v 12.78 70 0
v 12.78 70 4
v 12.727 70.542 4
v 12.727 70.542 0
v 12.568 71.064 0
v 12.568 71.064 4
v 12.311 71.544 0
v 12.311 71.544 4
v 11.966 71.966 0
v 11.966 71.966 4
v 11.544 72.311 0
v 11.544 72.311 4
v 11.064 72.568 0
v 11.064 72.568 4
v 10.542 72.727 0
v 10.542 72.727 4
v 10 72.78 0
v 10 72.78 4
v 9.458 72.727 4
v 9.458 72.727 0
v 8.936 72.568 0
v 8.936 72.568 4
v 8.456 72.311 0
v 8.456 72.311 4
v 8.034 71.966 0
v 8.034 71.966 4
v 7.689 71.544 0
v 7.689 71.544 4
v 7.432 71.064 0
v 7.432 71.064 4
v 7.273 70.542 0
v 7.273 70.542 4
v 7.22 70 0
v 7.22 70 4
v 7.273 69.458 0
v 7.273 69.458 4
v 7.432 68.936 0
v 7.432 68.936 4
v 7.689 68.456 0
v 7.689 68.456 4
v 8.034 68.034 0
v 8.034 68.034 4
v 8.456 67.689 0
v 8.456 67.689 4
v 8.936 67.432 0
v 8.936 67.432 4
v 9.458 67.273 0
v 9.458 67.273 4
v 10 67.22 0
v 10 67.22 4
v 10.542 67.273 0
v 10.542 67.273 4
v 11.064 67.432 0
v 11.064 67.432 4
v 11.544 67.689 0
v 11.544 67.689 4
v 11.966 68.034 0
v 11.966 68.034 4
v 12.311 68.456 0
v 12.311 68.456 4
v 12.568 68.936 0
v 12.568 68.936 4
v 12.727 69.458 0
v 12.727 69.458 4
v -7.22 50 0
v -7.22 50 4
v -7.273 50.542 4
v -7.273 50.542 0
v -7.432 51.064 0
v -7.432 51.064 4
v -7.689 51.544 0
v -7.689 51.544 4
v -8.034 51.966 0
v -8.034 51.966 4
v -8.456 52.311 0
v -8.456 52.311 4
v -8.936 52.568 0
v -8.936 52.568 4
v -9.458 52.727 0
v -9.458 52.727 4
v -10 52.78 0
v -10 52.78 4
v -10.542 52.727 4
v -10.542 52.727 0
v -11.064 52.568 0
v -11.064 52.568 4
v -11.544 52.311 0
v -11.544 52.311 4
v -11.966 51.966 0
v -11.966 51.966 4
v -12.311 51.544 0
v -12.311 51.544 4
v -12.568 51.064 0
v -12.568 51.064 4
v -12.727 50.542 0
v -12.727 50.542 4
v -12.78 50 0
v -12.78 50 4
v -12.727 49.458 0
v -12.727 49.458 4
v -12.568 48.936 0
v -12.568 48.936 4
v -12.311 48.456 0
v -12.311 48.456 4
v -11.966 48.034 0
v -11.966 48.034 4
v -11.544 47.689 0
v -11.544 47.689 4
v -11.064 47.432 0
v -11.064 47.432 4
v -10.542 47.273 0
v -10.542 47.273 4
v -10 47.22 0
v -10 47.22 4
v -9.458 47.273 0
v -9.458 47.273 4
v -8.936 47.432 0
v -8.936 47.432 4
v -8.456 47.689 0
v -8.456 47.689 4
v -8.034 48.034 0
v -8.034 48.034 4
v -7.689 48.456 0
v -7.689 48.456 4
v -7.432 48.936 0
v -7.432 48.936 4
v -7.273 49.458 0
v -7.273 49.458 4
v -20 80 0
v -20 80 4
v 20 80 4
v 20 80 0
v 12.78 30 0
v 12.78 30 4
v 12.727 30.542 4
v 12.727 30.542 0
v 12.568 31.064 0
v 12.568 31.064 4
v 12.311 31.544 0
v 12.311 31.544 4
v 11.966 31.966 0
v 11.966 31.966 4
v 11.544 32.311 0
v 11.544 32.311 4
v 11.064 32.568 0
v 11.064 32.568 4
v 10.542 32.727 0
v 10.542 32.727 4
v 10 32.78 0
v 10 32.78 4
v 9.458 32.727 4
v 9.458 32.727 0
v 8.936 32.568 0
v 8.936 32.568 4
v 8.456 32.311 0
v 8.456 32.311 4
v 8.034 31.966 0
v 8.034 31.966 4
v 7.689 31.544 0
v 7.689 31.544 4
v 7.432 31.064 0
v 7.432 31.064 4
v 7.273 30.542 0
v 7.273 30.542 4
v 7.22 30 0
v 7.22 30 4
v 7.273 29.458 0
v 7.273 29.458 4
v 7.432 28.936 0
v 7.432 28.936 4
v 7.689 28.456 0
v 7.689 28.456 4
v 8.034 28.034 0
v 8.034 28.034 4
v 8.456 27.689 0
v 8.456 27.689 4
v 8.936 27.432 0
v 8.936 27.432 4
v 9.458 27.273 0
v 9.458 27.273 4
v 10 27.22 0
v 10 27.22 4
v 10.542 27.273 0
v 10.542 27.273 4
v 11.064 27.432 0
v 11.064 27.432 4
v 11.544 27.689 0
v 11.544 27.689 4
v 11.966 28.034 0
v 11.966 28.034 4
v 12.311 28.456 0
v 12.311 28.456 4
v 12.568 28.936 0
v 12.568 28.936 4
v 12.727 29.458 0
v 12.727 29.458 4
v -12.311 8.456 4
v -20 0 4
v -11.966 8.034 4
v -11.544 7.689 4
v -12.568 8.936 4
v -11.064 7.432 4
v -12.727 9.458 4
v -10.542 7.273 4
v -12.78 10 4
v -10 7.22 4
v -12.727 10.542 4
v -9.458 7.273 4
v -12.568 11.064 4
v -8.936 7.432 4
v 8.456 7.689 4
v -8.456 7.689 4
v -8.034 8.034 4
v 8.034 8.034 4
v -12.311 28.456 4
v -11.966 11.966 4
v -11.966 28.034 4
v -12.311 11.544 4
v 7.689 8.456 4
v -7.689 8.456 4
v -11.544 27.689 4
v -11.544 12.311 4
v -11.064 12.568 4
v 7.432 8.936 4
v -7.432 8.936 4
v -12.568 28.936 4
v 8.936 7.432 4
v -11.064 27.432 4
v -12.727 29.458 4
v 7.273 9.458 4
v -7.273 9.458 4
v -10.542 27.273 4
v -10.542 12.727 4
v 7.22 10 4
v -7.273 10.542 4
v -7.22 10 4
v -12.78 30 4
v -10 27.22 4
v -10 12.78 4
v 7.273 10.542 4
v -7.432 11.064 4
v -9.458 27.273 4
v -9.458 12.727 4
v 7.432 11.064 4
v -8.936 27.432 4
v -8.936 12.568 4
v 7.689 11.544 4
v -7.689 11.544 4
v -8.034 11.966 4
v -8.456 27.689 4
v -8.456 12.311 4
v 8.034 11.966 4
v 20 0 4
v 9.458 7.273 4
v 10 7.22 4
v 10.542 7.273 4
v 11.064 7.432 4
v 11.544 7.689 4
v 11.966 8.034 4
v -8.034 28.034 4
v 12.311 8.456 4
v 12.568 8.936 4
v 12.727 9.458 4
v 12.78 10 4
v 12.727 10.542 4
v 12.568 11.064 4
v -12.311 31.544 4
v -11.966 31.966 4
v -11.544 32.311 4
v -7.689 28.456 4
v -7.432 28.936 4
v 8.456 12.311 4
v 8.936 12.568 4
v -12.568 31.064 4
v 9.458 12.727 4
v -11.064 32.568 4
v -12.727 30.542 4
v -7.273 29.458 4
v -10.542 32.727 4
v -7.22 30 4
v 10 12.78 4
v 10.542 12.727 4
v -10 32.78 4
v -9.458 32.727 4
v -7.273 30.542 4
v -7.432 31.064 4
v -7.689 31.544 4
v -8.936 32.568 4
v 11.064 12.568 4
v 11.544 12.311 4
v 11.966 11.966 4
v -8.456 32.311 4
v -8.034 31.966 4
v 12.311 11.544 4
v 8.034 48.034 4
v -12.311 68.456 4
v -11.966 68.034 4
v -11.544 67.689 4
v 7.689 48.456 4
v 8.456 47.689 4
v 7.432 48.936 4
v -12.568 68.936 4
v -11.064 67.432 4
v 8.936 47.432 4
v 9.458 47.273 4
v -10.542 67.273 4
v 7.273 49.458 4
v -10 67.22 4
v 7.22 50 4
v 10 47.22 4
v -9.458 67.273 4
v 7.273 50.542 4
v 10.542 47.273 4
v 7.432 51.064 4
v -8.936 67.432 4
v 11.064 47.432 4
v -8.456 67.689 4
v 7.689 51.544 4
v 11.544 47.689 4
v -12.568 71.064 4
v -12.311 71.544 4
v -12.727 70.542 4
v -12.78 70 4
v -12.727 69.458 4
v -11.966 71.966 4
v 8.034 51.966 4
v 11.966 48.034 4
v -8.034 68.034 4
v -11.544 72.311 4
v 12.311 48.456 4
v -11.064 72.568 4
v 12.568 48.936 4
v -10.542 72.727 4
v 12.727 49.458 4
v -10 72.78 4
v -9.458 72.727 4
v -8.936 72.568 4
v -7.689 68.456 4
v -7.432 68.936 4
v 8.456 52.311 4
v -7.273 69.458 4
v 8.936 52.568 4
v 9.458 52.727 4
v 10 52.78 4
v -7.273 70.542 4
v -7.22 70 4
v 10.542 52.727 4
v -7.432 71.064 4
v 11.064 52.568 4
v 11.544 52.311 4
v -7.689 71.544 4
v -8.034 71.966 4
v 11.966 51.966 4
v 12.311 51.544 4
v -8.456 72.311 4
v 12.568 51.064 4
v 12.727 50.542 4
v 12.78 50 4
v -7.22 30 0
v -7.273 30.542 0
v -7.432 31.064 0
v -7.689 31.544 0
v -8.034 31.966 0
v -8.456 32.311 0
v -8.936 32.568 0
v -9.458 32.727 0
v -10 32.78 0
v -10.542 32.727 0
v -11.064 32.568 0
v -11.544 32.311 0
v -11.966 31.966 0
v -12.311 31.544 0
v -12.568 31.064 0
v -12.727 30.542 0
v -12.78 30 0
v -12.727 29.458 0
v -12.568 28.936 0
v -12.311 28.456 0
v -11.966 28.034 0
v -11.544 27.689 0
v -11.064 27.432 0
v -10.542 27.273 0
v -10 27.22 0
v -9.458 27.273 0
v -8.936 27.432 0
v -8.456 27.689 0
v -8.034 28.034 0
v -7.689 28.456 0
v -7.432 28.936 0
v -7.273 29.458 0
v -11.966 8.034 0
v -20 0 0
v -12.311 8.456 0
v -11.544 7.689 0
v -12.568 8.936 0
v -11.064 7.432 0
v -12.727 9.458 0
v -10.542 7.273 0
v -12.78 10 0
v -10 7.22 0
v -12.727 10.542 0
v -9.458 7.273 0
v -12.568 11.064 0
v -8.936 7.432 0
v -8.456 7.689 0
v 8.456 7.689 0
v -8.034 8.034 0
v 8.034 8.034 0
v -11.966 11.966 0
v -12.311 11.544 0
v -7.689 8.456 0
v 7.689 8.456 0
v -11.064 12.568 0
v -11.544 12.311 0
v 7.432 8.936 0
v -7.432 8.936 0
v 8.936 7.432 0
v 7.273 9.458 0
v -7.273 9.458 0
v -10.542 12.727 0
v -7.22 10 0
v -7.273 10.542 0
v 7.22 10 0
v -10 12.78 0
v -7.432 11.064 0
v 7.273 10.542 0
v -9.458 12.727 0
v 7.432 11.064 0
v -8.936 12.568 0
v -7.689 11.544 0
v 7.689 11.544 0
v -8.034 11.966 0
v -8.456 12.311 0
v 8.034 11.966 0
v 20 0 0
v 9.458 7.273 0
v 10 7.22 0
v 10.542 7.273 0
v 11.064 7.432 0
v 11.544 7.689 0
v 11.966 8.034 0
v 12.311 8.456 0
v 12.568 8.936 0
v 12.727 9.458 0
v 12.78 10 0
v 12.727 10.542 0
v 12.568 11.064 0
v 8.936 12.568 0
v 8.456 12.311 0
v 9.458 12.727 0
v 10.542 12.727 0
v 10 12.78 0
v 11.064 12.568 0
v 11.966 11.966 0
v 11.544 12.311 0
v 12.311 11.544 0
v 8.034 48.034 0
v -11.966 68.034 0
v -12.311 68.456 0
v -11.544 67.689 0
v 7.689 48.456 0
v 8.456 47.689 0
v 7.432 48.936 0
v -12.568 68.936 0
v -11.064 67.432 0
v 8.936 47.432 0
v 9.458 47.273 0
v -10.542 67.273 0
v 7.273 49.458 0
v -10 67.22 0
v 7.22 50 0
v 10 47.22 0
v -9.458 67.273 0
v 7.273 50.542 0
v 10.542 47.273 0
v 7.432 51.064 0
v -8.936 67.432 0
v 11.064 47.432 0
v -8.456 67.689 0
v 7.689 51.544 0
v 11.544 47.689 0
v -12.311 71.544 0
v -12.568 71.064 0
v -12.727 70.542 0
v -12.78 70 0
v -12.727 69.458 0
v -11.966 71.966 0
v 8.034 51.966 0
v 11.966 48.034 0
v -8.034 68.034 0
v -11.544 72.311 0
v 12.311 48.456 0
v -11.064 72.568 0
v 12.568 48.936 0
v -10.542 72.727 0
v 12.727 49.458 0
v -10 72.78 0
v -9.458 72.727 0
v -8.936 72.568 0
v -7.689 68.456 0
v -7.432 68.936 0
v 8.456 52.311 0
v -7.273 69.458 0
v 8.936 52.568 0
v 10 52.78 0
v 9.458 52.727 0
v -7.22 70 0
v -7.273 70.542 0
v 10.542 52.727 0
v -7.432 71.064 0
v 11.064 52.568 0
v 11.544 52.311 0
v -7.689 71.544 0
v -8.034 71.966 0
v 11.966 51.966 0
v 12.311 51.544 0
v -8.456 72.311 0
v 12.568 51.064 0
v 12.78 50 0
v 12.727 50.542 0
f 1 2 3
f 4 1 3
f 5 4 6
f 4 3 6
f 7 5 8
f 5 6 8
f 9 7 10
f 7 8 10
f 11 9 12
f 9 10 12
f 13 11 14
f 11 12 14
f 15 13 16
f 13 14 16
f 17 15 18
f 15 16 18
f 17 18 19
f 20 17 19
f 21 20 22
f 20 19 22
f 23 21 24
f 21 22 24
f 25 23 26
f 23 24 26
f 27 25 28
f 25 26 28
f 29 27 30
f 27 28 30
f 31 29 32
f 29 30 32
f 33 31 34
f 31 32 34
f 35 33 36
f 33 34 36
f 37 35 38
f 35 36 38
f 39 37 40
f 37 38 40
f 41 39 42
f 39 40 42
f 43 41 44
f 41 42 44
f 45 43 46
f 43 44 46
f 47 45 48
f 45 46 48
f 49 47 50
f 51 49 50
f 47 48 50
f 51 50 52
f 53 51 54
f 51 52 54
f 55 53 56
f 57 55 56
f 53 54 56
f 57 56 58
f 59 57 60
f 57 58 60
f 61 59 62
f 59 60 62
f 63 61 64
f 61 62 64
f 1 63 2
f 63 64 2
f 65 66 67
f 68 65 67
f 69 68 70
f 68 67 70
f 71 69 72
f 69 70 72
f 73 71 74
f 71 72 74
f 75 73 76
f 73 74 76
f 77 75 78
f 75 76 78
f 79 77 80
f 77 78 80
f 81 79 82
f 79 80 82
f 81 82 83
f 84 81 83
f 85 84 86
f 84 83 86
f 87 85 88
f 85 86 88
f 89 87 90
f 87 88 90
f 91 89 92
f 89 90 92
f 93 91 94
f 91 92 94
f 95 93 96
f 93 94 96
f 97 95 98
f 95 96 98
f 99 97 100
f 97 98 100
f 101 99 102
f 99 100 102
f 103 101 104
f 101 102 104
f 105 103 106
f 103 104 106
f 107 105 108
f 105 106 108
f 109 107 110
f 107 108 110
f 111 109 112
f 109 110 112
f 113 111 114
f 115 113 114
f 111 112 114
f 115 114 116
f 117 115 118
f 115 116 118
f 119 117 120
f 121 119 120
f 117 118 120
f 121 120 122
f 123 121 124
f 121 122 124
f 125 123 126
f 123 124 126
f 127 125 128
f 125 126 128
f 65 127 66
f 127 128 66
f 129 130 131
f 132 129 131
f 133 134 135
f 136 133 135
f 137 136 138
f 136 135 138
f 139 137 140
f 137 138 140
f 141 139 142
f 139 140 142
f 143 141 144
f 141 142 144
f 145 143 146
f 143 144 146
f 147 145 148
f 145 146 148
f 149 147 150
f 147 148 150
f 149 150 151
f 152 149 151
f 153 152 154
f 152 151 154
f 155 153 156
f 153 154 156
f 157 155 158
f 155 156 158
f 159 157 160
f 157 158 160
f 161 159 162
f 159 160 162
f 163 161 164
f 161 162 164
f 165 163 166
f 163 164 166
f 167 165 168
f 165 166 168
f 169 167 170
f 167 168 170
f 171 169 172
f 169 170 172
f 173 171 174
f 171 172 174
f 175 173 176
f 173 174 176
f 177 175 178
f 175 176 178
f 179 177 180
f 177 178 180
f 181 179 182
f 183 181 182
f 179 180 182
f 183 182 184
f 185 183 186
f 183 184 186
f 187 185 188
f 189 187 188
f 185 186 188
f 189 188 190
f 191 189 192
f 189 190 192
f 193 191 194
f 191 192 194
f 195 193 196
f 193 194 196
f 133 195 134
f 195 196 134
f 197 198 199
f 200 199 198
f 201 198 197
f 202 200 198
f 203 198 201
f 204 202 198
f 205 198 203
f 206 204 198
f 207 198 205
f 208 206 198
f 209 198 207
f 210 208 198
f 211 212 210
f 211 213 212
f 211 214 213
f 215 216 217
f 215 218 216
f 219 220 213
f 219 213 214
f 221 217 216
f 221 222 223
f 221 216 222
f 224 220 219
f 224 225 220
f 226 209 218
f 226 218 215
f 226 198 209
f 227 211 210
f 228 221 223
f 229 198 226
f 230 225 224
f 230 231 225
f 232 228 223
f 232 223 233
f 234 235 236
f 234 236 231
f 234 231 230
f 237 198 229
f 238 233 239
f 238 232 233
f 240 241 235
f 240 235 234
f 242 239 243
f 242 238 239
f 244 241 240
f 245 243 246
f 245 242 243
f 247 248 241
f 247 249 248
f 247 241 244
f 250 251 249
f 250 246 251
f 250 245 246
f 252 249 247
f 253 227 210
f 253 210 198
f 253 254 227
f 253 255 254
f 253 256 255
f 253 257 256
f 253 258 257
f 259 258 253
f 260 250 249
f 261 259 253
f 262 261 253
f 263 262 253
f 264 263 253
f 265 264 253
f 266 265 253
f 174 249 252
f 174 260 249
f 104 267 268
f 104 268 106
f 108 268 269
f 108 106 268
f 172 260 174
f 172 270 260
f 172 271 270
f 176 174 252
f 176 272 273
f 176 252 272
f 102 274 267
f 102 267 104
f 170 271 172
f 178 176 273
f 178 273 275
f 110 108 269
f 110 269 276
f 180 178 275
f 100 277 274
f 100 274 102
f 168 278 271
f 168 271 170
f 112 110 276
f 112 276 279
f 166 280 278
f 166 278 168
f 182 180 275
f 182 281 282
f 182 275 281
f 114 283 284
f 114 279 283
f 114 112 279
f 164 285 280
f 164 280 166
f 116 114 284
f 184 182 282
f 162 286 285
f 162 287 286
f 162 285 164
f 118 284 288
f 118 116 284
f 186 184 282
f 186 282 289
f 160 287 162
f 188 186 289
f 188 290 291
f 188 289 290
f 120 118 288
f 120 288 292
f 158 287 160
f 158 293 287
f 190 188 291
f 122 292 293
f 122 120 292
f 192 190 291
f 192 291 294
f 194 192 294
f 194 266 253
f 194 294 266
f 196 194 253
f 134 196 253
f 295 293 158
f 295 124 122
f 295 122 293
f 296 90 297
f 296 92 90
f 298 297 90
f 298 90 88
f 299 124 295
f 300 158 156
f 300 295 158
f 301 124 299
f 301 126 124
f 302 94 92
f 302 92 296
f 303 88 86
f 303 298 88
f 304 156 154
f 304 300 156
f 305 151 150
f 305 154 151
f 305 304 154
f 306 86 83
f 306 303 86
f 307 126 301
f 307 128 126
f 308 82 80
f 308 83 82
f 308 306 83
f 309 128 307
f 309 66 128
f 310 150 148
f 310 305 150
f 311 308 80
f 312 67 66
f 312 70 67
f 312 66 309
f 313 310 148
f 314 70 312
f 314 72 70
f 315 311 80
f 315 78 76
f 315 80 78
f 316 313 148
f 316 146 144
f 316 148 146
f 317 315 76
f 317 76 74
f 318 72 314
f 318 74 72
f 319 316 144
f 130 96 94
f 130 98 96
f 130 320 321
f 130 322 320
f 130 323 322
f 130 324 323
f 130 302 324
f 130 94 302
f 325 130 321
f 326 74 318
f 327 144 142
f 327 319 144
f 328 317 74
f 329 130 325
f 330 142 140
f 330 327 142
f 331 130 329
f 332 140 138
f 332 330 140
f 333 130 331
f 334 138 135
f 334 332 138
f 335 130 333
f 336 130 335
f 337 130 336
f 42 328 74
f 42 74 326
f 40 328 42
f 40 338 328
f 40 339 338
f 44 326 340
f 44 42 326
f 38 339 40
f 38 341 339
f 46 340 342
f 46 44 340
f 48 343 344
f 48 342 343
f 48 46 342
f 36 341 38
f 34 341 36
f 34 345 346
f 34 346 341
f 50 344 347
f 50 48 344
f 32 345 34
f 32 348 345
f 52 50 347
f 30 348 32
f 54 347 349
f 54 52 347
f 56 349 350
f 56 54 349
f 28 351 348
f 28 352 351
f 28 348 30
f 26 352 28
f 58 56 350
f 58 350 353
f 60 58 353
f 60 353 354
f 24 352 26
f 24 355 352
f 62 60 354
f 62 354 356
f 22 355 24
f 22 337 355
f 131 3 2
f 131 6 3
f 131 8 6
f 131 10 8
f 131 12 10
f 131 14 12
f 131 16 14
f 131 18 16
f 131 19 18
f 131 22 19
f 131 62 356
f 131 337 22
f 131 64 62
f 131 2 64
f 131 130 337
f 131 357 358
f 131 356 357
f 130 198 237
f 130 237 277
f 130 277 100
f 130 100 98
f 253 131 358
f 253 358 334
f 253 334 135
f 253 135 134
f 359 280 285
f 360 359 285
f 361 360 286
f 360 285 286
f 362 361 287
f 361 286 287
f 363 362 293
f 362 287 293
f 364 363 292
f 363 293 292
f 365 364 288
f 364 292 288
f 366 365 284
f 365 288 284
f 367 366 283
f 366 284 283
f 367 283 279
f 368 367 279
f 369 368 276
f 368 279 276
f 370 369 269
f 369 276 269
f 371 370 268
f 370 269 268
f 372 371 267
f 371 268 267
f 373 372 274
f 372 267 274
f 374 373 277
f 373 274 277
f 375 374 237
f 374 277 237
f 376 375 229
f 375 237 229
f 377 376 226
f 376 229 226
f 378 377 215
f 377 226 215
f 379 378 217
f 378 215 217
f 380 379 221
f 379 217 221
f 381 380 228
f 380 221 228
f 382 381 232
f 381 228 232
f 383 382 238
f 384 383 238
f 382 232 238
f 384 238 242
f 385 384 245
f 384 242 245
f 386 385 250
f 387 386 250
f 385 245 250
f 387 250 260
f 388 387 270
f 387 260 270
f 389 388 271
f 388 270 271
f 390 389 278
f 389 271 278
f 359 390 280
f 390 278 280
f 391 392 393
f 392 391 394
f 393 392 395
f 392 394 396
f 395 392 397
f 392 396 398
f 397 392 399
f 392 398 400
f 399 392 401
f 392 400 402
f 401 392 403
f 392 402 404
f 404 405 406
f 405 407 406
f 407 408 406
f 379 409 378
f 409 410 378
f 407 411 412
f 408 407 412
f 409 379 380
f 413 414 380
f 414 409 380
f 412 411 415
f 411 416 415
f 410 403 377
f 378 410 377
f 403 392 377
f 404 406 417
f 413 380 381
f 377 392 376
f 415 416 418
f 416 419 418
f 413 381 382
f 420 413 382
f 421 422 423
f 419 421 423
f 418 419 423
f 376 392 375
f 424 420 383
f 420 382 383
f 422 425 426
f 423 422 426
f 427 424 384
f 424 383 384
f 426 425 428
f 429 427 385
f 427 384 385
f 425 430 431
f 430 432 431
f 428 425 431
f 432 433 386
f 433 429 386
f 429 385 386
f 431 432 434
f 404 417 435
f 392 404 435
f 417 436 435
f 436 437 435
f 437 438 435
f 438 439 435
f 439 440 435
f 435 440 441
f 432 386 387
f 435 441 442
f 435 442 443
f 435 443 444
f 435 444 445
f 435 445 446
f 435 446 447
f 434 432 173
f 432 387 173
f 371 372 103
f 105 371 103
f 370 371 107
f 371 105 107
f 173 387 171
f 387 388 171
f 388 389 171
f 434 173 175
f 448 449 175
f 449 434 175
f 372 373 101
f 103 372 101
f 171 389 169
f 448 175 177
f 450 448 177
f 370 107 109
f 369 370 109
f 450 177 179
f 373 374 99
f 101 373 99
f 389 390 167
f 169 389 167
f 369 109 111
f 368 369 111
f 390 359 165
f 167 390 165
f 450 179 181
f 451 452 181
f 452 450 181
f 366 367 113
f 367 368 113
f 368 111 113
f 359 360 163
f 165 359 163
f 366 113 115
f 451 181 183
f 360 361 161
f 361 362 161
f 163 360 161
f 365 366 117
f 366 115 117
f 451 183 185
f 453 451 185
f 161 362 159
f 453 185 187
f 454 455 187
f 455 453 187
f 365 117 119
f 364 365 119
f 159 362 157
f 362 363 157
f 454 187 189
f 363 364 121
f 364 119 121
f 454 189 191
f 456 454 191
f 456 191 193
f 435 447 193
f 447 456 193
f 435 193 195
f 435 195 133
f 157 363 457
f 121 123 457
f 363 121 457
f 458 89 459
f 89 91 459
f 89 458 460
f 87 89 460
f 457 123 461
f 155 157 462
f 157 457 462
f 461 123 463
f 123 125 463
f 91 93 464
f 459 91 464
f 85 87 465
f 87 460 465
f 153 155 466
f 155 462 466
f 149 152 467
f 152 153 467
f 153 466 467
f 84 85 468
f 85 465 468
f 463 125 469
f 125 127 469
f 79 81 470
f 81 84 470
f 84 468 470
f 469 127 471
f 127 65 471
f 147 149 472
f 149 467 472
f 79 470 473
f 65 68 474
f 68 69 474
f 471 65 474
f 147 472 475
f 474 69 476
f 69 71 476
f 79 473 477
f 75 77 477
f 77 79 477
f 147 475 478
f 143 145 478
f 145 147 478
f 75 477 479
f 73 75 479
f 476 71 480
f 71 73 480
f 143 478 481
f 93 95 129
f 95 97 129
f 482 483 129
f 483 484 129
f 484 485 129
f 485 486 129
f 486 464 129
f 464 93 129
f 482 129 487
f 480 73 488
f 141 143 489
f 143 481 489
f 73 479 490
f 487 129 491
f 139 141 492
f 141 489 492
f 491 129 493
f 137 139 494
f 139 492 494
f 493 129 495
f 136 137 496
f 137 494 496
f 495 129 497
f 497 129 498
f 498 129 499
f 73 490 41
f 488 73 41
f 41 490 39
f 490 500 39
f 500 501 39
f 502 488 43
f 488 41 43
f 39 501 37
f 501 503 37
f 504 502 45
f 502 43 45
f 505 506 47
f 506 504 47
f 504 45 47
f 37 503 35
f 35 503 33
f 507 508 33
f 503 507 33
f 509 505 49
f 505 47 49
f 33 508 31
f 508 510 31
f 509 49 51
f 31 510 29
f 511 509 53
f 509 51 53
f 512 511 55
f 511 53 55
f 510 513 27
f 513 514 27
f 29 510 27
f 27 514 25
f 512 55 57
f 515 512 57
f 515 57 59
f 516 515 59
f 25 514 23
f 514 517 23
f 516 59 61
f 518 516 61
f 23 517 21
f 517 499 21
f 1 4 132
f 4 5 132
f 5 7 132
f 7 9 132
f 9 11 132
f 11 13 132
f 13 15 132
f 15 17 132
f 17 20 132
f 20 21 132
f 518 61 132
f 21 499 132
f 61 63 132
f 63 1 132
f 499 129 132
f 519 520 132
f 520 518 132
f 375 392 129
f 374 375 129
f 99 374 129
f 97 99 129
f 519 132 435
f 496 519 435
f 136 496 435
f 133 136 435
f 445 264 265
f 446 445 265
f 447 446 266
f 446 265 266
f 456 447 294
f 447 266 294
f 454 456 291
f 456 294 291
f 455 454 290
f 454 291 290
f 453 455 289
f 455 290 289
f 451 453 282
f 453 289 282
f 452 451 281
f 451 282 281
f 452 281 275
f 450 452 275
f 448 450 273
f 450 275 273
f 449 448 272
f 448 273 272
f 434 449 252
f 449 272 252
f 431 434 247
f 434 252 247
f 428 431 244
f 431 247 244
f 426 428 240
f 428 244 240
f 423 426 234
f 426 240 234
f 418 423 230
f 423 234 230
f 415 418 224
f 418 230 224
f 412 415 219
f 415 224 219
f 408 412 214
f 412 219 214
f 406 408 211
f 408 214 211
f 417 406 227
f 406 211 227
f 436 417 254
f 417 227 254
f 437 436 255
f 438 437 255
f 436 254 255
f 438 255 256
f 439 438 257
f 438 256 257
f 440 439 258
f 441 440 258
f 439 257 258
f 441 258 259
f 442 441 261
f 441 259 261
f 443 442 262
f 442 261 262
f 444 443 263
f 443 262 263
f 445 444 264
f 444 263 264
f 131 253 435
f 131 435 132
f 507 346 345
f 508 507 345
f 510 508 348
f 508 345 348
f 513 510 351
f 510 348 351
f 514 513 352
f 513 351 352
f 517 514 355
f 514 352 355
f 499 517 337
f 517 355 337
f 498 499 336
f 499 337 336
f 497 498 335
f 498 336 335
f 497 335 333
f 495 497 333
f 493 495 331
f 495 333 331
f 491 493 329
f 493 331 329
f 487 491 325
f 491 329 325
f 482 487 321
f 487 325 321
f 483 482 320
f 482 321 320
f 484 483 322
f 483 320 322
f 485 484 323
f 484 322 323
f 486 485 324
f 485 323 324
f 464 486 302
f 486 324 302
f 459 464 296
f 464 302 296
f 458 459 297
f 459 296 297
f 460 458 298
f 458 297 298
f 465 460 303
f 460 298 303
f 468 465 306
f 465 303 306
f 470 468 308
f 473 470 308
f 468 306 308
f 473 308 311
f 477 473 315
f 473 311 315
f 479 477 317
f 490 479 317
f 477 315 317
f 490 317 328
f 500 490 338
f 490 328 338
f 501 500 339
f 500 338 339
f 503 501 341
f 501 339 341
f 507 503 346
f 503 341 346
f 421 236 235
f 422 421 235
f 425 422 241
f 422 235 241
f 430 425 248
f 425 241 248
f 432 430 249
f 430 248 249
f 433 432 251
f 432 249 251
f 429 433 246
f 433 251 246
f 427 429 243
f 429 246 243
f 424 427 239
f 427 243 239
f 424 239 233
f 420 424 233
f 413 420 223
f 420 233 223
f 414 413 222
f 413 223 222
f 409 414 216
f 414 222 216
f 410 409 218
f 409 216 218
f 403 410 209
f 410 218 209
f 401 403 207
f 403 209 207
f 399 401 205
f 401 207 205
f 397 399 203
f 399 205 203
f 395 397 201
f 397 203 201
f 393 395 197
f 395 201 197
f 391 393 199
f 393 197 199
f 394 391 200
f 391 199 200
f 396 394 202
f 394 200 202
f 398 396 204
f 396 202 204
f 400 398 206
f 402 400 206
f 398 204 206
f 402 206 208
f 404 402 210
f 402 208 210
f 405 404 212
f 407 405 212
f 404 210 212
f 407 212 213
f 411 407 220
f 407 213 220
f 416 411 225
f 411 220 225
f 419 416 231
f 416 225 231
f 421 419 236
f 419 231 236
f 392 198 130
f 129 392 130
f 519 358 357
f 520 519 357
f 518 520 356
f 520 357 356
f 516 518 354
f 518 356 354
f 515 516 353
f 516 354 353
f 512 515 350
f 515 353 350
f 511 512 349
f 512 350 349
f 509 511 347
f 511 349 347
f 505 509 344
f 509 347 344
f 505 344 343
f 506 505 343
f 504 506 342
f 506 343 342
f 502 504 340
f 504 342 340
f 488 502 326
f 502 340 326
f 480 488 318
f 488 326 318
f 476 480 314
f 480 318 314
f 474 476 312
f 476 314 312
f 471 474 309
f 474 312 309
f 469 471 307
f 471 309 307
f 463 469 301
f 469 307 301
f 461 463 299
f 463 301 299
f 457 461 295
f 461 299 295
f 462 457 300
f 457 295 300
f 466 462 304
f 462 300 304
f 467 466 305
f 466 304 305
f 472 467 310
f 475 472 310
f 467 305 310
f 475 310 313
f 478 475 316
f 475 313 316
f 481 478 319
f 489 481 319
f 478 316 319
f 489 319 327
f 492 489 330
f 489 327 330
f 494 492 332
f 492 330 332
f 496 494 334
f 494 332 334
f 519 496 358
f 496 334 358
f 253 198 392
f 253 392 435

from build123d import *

# Parameters (mm, degrees)
SKETCH1_W           = 40
SKETCH1_H           = 80
SKETCH1_R           = 2.78
BOSS_EXTRUDE1_DEPTH = 4


with BuildPart() as part:
    # Sketch1 → Boss-Extrude1 (new body)
    with BuildSketch(Plane.XY.offset(4)):
        with Locations((0, 40)):
            Rectangle(SKETCH1_W, SKETCH1_H)
        with Locations((-10, 70)):
            Circle(SKETCH1_R, mode=Mode.SUBTRACT)
        with Locations((-10, 50)):
            Circle(SKETCH1_R, mode=Mode.SUBTRACT)
        with Locations((-10, 30)):
            Circle(SKETCH1_R, mode=Mode.SUBTRACT)
        with Locations((-10, 10)):
            Circle(SKETCH1_R, mode=Mode.SUBTRACT)
        with Locations((10, 70)):
            Circle(SKETCH1_R, mode=Mode.SUBTRACT)
        with Locations((10, 50)):
            Circle(SKETCH1_R, mode=Mode.SUBTRACT)
        with Locations((10, 30)):
            Circle(SKETCH1_R, mode=Mode.SUBTRACT)
        with Locations((10, 10)):
            Circle(SKETCH1_R, mode=Mode.SUBTRACT)
    extrude(amount=-BOSS_EXTRUDE1_DEPTH)


solid = part.part
